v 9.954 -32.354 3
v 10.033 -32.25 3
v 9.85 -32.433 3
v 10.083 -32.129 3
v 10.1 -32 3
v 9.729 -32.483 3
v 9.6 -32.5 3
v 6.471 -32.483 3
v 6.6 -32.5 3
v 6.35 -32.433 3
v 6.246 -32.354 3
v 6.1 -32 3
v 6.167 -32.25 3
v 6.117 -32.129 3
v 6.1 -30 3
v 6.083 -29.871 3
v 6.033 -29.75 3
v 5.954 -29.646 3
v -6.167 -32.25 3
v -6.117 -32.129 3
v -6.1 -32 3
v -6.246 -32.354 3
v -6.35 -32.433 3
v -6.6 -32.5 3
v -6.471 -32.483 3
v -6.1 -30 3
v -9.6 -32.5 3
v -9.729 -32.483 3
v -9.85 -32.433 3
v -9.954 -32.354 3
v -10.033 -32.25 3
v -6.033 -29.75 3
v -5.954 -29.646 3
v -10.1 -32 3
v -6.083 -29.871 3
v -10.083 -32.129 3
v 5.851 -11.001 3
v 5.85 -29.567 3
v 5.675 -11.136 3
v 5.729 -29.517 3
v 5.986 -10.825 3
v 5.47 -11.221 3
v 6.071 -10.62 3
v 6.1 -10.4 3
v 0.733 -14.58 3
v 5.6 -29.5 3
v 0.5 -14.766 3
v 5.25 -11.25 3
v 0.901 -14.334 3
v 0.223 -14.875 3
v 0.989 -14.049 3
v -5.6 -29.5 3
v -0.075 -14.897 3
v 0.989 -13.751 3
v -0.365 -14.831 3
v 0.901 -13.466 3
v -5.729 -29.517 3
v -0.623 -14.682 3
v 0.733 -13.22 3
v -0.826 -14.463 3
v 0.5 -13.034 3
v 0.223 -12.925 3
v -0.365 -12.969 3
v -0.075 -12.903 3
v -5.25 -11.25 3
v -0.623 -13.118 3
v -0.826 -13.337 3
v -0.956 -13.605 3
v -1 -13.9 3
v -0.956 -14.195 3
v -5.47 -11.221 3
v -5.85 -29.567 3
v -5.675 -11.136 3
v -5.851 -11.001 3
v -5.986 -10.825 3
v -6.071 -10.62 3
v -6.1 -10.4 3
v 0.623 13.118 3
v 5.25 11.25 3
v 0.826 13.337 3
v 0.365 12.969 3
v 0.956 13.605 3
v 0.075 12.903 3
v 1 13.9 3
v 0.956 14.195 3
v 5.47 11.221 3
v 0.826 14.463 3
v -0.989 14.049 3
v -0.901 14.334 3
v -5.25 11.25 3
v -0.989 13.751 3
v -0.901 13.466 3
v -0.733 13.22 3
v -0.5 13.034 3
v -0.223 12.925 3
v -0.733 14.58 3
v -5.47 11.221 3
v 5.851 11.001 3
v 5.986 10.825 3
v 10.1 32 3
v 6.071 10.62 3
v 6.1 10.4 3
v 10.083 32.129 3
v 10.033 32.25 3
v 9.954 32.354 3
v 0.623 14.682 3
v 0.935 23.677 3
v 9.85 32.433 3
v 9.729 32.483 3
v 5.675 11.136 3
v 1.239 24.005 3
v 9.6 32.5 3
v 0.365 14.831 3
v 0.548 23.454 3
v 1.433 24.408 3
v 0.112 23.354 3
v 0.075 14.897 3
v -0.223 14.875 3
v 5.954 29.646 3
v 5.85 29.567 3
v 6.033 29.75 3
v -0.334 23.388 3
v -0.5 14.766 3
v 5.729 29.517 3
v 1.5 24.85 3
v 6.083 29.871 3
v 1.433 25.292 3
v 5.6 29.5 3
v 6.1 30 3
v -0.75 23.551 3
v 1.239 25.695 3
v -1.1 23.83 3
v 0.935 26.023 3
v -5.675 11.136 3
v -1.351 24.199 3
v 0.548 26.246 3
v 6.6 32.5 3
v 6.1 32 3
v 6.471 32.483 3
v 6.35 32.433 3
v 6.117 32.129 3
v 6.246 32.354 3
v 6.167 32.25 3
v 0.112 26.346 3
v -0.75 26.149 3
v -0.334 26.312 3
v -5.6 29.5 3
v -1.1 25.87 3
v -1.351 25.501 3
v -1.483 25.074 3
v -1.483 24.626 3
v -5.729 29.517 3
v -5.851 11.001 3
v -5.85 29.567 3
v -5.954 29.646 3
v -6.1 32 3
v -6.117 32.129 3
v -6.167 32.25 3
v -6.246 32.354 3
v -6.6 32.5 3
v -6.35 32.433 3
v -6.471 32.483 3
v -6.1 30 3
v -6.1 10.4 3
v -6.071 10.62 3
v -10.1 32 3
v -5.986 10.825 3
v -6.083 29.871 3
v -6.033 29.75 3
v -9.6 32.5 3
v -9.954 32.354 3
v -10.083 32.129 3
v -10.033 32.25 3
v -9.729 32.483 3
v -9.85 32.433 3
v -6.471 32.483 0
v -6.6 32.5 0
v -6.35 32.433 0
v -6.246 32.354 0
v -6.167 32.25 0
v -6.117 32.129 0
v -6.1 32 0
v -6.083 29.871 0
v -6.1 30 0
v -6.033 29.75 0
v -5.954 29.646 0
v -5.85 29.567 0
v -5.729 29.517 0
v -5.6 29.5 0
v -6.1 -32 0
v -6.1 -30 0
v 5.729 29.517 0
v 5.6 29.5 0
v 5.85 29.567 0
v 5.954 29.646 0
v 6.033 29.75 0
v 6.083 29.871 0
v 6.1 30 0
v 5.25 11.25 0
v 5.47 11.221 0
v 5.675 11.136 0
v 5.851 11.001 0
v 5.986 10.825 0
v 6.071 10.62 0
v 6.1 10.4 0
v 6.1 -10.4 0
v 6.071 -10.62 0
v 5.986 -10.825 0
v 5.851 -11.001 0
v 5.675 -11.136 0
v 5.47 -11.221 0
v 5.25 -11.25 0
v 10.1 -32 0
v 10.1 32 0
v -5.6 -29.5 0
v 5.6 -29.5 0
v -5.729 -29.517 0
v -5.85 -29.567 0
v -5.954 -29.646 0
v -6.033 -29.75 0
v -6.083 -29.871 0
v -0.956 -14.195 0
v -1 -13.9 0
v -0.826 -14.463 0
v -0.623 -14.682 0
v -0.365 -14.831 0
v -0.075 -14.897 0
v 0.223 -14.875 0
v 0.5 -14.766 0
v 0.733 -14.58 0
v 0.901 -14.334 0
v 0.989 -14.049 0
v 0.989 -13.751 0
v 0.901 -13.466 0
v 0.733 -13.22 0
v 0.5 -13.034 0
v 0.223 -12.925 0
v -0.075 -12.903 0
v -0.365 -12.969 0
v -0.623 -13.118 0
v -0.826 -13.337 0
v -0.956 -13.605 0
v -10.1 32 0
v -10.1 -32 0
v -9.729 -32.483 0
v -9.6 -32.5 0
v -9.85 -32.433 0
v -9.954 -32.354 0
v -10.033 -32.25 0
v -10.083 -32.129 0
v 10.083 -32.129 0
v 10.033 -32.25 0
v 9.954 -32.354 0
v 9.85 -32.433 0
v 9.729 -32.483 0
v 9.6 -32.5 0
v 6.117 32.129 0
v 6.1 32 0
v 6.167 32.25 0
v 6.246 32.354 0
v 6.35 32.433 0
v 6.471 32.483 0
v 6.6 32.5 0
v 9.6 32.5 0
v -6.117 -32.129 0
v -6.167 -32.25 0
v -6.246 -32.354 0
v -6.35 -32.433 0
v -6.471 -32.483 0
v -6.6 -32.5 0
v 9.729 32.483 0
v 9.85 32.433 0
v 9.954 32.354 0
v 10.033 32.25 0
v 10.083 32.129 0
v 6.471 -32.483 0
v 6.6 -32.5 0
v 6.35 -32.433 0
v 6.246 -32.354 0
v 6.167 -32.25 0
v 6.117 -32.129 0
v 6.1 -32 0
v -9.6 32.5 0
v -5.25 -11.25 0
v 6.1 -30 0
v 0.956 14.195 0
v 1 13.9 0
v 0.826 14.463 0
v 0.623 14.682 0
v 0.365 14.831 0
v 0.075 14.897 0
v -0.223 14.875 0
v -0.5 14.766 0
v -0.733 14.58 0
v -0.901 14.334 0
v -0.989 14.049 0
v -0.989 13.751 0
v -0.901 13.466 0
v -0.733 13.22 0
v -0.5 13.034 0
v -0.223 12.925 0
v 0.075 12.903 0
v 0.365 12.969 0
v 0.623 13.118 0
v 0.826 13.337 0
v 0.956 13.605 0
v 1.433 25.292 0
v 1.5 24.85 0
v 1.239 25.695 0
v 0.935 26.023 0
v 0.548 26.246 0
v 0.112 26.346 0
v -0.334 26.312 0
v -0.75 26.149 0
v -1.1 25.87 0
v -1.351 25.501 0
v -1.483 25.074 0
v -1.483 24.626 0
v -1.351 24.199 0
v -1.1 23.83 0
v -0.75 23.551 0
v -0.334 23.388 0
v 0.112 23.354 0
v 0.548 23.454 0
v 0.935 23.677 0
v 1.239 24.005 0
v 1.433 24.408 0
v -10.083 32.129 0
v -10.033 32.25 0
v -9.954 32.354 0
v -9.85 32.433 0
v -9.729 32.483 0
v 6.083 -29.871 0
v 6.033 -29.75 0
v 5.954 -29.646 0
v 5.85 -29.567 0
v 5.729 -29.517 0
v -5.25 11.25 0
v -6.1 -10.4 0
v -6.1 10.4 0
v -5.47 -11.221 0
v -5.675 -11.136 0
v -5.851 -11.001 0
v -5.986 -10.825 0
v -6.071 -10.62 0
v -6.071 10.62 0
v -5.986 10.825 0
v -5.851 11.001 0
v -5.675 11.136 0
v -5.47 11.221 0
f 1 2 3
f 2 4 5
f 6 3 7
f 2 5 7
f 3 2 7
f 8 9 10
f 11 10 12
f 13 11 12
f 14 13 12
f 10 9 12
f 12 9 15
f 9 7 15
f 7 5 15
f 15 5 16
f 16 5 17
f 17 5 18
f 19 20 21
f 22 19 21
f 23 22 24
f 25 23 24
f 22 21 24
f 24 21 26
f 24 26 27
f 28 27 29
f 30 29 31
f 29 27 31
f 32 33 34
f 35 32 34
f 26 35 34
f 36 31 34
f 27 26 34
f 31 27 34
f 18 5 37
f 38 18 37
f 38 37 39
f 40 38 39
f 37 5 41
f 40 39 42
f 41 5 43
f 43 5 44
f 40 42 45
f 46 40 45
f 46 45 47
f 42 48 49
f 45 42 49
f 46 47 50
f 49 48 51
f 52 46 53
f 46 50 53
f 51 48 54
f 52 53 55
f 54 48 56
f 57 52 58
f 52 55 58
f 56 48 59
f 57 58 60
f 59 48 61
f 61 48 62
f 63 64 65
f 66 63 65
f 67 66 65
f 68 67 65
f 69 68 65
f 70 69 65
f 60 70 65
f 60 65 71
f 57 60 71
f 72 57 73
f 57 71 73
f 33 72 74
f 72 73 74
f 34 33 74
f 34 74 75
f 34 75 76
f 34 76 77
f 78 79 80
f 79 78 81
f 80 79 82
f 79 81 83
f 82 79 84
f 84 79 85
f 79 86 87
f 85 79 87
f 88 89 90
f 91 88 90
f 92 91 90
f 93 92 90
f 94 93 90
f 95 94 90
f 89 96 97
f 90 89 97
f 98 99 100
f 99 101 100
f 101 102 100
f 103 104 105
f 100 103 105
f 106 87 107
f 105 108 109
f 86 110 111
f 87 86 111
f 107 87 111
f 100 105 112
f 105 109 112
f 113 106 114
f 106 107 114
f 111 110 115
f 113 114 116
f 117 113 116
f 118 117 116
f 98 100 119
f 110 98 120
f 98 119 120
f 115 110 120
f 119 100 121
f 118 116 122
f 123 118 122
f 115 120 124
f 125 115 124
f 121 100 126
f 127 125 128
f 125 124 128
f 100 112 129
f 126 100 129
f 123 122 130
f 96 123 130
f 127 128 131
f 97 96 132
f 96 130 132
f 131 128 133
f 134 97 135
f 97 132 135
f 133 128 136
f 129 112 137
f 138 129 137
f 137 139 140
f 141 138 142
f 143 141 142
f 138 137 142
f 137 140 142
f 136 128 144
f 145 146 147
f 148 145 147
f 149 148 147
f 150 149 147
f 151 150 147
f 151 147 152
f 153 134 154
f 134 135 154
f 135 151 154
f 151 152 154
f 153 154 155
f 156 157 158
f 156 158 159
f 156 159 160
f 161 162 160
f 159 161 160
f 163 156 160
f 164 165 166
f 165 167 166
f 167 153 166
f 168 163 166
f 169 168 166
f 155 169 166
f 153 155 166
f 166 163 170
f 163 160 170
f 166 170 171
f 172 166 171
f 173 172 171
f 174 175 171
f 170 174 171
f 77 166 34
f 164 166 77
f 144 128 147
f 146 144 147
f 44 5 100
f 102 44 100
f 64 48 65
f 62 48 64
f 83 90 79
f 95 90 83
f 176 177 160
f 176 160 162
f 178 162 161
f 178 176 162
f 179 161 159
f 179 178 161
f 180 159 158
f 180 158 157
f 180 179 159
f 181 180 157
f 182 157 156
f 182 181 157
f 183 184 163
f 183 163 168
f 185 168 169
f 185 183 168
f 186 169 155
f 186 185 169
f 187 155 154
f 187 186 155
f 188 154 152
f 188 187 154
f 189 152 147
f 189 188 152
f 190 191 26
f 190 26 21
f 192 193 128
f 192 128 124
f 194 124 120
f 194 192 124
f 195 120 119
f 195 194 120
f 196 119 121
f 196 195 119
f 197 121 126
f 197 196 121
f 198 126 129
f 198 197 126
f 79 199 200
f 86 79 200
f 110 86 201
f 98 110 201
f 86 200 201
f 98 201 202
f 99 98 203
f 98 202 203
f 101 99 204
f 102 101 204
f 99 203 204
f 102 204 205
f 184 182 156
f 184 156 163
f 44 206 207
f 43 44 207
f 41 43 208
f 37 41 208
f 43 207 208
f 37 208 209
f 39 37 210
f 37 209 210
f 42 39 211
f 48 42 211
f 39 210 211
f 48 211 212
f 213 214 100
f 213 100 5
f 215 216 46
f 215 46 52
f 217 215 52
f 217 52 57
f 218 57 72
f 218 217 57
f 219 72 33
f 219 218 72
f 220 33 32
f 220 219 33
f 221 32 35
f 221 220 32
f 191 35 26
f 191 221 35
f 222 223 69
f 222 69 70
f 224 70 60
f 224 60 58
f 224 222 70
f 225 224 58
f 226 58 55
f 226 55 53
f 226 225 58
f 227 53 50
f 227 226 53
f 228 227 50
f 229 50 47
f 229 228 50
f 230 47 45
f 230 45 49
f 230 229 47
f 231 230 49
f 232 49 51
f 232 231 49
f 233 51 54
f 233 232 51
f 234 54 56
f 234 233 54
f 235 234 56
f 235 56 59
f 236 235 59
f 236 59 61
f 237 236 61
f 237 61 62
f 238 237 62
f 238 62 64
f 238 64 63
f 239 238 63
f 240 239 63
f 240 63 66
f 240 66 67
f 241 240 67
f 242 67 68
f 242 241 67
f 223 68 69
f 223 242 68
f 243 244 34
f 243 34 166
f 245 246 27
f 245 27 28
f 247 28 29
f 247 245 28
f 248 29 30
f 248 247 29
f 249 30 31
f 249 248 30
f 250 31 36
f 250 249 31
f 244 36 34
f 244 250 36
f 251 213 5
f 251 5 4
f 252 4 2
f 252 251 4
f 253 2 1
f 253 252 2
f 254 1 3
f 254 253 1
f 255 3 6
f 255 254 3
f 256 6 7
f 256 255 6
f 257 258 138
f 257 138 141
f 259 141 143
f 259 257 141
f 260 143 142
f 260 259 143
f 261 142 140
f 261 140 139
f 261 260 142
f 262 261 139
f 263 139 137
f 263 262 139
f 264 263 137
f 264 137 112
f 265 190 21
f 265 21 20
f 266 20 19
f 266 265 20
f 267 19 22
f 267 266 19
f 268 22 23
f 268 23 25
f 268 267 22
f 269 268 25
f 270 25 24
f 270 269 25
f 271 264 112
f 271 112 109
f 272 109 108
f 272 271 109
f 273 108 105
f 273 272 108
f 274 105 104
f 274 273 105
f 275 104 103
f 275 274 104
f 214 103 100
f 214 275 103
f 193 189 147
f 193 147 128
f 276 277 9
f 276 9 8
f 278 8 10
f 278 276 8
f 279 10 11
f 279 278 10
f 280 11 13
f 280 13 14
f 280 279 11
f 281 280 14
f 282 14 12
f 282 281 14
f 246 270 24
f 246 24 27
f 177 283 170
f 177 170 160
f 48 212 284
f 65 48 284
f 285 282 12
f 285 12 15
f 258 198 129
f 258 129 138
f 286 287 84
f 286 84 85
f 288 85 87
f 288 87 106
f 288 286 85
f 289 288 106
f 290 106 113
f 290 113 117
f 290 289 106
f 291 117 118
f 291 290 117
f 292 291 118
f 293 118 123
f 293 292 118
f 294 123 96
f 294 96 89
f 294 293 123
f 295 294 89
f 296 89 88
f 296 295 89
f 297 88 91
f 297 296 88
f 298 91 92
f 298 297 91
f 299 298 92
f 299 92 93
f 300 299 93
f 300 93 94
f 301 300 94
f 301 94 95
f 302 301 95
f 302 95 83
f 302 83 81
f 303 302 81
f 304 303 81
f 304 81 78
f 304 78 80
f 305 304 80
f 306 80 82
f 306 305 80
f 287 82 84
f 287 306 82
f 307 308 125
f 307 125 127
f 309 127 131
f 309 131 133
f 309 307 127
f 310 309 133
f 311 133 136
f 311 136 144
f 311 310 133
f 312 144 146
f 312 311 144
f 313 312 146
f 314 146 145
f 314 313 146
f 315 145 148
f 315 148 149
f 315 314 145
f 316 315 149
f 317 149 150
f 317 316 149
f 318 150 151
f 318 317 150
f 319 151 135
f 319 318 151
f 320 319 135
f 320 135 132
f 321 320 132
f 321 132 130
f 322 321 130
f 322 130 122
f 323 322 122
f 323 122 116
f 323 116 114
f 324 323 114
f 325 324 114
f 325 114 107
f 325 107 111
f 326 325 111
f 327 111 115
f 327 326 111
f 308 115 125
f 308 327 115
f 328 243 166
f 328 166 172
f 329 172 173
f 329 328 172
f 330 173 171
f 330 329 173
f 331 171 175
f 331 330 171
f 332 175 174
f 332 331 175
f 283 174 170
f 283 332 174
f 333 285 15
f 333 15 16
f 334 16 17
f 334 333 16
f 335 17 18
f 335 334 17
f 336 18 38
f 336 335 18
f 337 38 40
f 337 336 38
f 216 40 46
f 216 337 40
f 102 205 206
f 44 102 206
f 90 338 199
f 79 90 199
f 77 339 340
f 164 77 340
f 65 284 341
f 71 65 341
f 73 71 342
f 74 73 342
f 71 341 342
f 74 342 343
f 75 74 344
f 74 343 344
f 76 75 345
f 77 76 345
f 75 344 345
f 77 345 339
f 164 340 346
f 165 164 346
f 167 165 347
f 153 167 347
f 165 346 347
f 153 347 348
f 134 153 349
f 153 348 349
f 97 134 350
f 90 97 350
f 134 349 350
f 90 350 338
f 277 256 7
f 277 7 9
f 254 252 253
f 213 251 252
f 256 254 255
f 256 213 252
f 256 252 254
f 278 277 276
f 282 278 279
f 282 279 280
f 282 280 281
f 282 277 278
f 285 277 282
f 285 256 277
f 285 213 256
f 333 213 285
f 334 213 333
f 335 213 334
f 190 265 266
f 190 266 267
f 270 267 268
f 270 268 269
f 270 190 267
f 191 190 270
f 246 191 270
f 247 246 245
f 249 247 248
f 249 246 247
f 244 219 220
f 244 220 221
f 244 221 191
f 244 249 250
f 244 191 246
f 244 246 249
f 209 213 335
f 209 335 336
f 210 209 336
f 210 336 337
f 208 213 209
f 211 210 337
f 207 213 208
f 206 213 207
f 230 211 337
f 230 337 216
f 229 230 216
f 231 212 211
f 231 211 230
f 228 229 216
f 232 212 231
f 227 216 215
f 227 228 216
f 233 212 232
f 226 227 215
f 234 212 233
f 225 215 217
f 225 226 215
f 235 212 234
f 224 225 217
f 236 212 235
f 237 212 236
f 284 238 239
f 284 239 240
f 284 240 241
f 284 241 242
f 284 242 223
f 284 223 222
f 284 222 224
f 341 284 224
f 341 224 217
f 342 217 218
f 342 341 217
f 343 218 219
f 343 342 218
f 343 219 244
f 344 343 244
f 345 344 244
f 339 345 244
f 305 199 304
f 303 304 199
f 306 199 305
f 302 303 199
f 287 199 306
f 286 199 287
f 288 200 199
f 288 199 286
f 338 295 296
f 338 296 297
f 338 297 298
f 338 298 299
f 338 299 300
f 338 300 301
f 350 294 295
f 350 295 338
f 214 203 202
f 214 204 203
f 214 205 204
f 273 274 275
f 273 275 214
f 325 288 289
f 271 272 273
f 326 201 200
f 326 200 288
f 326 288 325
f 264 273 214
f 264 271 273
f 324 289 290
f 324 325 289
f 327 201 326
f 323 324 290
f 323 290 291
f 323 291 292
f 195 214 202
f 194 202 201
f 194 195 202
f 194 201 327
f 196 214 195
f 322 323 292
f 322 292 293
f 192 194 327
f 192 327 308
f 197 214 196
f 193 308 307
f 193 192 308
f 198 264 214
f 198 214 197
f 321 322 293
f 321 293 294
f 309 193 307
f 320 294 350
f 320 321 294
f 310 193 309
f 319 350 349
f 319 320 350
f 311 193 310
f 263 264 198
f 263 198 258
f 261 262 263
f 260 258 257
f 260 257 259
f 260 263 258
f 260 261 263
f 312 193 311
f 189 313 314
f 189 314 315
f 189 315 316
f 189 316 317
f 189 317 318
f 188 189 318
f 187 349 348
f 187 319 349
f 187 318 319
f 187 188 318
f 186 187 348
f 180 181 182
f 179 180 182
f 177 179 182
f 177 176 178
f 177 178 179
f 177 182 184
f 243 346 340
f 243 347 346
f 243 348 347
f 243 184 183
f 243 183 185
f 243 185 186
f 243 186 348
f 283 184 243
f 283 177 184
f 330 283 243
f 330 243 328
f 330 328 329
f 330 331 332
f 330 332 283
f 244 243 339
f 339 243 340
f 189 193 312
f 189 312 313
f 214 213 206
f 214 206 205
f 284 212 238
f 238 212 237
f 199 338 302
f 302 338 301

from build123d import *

# Parameters (mm, degrees)
SKETCH1_R           = 1
SKETCH1_R_2         = 1.5
BOSS_EXTRUDE1_DEPTH = 3


with BuildPart() as part:
    # Sketch1 → Boss-Extrude1 (new body)
    with BuildSketch(Plane.XY):
        with BuildLine():
            Line((5.6, -29.5), (-5.6, -29.5))
            ThreePointArc((-5.6, -29.5), (-5.953553391, -29.646446609), (-6.1, -30))
            Line((-6.1, -30), (-6.1, -32))
            ThreePointArc((-6.1, -32), (-6.246446609, -32.353553391), (-6.6, -32.5))
            Line((-6.6, -32.5), (-9.6, -32.5))
            ThreePointArc((-9.6, -32.5), (-9.953553391, -32.353553391), (-10.1, -32))
            Line((-10.1, -32), (-10.1, -22.5))
            Line((-10.1, -22.5), (-10.1, 22.5))
            Line((-10.1, 22.5), (-10.1, 32))
            ThreePointArc((-10.1, 32), (-9.953553391, 32.353553391), (-9.6, 32.5))
            Line((-9.6, 32.5), (-6.6, 32.5))
            ThreePointArc((-6.6, 32.5), (-6.246446609, 32.353553391), (-6.1, 32))
            Line((-6.1, 32), (-6.1, 30))
            ThreePointArc((-6.1, 30), (-5.953553391, 29.646446609), (-5.6, 29.5))
            Line((-5.6, 29.5), (5.6, 29.5))
            ThreePointArc((5.6, 29.5), (5.953553391, 29.646446609), (6.1, 30))
            Line((6.1, 30), (6.1, 32))
            ThreePointArc((6.1, 32), (6.246446609, 32.353553391), (6.6, 32.5))
            Line((6.6, 32.5), (9.6, 32.5))
            ThreePointArc((9.6, 32.5), (9.953553391, 32.353553391), (10.1, 32))
            Line((10.1, 32), (10.1, 22.5))
            Line((10.1, 22.5), (10.1, -22.5))
            Line((10.1, -22.5), (10.1, -32))
            ThreePointArc((10.1, -32), (9.953553391, -32.353553391), (9.6, -32.5))
            Line((9.6, -32.5), (6.6, -32.5))
            ThreePointArc((6.6, -32.5), (6.246446609, -32.353553391), (6.1, -32))
            Line((6.1, -32), (6.1, -30))
            ThreePointArc((6.1, -30), (5.953553391, -29.646446609), (5.6, -29.5))
        make_face()
        with Locations((0, 13.9)):
            Circle(SKETCH1_R, mode=Mode.SUBTRACT)
        with Locations(Location((0, -13.9, 0), (0, 0, 180))):
            Circle(SKETCH1_R, mode=Mode.SUBTRACT)
        with Locations((0, 24.85)):
            Circle(SKETCH1_R_2, mode=Mode.SUBTRACT)
        with BuildLine():
            Line((5.25, -11.25), (-5.25, -11.25))
            ThreePointArc((-5.25, -11.25), (-5.851040764, -11.001040764), (-6.1, -10.4))
            Line((-6.1, -10.4), (-6.1, 10.4))
            ThreePointArc((-6.1, 10.4), (-5.851040764, 11.001040764), (-5.25, 11.25))
            Line((-5.25, 11.25), (5.25, 11.25))
            ThreePointArc((5.25, 11.25), (5.851040764, 11.001040764), (6.1, 10.4))
            Line((6.1, 10.4), (6.1, -10.4))
            ThreePointArc((6.1, -10.4), (5.851040764, -11.001040764), (5.25, -11.25))
        make_face(mode=Mode.SUBTRACT)
    extrude(amount=BOSS_EXTRUDE1_DEPTH)


solid = part.part
